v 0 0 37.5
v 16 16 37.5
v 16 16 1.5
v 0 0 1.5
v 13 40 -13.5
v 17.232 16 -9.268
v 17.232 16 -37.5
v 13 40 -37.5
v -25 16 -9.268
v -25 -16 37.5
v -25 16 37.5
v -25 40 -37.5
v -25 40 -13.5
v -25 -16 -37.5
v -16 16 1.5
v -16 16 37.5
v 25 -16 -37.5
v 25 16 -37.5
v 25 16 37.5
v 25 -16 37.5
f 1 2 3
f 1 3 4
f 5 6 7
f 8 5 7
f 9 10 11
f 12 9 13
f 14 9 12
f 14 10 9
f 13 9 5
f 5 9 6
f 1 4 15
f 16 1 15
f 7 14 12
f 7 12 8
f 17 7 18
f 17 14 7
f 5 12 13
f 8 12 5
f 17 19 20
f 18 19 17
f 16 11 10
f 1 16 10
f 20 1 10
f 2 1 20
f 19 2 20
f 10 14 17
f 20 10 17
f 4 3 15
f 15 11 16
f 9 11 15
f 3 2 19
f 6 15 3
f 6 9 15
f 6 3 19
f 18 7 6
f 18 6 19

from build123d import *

# Parameters (mm, degrees)
SKETCH1_W           = 50
SKETCH1_H           = 75
BOSS_EXTRUDE1_DEPTH = 16
CUT_EXTRUDE1_DEPTH  = 36
SKETCH3_W           = 38
SKETCH3_H           = 24
BOSS_EXTRUDE4_DEPTH = 24
DRAFT2_ANGLE        = 10


with BuildPart() as part:
    # Sketch1 → Boss-Extrude1 (new, symmetric)
    with BuildSketch(Plane(origin=(0, 0, 0), x_dir=(1, 0, 0), z_dir=(0, 1, 0))):
        Rectangle(SKETCH1_W, SKETCH1_H)
    extrude(amount=BOSS_EXTRUDE1_DEPTH, both=True)

    # Sketch2 → Cut-Extrude1 (cut)
    with BuildSketch(Plane.XY.offset(37.5)):
        Polygon((0, 0), (-16, 16), (16, 16), align=None)
    extrude(amount=-CUT_EXTRUDE1_DEPTH, mode=Mode.SUBTRACT)

    # Sketch3 → Boss-Extrude4 (add)
    with BuildSketch(Plane(origin=(0, 16, 0), x_dir=(1, 0, 0), z_dir=(0, 1, 0))):
        with Locations((-6, 25.5)):
            Rectangle(SKETCH3_W, SKETCH3_H)
    extrude(amount=BOSS_EXTRUDE4_DEPTH)

    # Draft2
    draft2_faces = [part.faces().sort_by_distance(p)[0] for p in [
        (13, 28, -25.5),
        (-6, 28, -13.5),
    ]]
    draft(draft2_faces, Plane.ZX.offset(40), DRAFT2_ANGLE)


solid = part.part
